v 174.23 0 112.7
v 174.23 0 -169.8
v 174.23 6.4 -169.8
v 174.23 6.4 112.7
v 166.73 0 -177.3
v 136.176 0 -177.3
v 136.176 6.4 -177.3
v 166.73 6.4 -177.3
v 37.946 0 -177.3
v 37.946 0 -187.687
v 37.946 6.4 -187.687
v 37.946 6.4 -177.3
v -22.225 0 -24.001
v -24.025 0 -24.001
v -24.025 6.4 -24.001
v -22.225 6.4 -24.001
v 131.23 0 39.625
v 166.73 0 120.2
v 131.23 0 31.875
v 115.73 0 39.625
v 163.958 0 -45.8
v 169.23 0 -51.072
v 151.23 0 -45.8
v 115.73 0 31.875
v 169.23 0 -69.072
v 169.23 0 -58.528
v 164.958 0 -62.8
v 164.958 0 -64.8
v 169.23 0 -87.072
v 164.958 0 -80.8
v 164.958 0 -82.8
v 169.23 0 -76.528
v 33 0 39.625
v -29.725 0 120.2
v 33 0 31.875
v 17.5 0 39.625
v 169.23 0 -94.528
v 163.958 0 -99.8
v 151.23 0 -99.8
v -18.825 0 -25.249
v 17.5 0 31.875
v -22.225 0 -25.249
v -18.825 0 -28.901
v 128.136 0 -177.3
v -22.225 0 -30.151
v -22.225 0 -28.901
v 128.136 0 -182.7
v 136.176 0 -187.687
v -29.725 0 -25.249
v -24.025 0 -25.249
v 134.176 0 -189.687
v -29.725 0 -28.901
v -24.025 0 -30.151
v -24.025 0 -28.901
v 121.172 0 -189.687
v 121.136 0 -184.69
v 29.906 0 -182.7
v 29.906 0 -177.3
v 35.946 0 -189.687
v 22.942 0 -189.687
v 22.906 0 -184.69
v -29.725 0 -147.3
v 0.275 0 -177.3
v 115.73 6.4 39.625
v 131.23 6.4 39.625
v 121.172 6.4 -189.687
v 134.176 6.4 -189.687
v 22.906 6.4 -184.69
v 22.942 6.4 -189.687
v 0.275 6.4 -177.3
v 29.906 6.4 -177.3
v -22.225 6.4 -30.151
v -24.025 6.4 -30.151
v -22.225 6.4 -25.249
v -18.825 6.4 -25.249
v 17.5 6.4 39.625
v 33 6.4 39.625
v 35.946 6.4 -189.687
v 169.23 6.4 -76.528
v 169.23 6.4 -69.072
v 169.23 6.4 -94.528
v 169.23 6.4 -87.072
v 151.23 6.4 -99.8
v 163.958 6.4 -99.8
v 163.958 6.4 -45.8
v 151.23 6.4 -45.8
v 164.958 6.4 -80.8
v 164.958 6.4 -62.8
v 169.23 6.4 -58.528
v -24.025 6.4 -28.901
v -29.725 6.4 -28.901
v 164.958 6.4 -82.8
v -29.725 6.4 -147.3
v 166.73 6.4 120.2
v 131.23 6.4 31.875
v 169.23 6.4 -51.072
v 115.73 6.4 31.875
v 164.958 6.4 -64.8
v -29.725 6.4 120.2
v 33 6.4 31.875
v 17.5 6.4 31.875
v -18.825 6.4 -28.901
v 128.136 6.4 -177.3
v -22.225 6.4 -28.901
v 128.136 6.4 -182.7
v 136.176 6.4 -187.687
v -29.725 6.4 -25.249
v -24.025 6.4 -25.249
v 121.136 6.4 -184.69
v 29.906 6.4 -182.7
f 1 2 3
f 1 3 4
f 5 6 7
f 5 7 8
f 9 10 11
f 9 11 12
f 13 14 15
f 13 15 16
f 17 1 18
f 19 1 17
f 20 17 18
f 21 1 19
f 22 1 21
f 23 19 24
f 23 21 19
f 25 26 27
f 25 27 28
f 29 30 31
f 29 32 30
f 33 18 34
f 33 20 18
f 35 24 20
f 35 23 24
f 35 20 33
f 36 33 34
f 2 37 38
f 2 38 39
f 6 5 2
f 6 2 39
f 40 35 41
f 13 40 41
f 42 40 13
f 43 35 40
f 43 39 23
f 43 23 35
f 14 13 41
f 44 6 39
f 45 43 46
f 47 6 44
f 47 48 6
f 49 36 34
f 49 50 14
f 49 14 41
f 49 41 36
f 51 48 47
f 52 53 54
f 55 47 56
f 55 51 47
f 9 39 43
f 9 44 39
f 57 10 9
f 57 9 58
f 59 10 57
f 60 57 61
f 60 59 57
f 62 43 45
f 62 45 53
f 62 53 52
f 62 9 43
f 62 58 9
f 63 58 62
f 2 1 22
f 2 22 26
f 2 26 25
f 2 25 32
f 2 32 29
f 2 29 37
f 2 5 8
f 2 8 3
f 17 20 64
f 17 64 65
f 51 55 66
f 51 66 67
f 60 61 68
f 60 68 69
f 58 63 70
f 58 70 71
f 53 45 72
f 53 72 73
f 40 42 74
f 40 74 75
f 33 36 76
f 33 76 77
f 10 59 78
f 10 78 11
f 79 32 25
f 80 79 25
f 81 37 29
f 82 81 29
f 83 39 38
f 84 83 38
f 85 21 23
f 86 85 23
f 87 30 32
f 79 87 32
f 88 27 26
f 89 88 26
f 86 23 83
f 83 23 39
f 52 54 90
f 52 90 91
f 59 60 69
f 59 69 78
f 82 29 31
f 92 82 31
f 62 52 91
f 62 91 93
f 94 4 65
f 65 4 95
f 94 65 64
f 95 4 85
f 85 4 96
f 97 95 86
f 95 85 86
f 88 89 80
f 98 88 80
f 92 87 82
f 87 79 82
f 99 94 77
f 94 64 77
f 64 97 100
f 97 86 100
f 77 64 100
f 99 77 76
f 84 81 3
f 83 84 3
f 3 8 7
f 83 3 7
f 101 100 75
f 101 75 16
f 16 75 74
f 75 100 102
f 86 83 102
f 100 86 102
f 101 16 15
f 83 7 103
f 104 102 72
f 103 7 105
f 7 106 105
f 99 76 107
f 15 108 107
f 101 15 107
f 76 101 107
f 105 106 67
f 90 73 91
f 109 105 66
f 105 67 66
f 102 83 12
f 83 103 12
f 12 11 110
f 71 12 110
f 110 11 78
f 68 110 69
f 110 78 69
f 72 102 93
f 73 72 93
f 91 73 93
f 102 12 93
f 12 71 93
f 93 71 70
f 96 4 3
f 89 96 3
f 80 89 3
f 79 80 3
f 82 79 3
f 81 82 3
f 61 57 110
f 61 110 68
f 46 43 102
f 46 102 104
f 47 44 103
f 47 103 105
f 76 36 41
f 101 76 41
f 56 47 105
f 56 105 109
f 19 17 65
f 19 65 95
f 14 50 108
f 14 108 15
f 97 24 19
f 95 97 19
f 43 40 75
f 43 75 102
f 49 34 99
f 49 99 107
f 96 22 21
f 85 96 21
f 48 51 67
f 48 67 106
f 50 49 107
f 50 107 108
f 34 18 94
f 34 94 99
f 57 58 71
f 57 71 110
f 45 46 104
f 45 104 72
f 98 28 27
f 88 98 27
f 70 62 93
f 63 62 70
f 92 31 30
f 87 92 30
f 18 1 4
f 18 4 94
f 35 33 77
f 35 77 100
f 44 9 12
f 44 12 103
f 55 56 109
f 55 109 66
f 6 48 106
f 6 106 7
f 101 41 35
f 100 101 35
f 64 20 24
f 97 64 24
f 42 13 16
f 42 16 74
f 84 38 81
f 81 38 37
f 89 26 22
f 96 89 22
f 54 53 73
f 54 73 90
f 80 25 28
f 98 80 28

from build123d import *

# Parameters (mm, degrees)
SKETCH1_W           = 15.5
SKETCH1_H           = 7.75
BOSS_EXTRUDE1_DEPTH = 6.4


with BuildPart() as part:
    # Sketch1 → Boss-Extrude1 (new body)
    with BuildSketch(Plane(origin=(0, 0, 0), x_dir=(1, 0, 0), z_dir=(0, 1, 0))):
        Polygon((136.176, 177.3), (166.73, 177.3), (174.23, 169.8), (174.23, -112.7), (166.73, -120.2), (-29.725, -120.2), (-29.725, 25.249320413), (-24.025, 25.249320413), (-24.025, 24.000679587), (-22.225, 24.000679587), (-22.225, 25.249320413), (-18.825, 25.249320413), (-18.825, 28.900679587), (-22.225, 28.900679587), (-22.225, 30.150679587), (-24.025, 30.150679587), (-24.025, 28.900679587), (-29.725, 28.900679587), (-29.725, 147.3), (0.275, 177.3), (29.906, 177.3), (29.906, 182.7), (22.906, 184.689990555), (22.941578202, 189.687449255), (35.946, 189.687449255), (37.946, 187.687449255), (37.946, 177.3), (128.136, 177.3), (128.136, 182.7), (121.136, 184.689990555), (121.171578202, 189.687449255), (134.176, 189.687449255), (136.176, 187.687449255), align=None)
        with Locations((123.48, -35.75)):
            Rectangle(SKETCH1_W, SKETCH1_H, mode=Mode.SUBTRACT)
        with Locations((25.25, -35.75)):
            Rectangle(SKETCH1_W, SKETCH1_H, mode=Mode.SUBTRACT)
        Polygon((164.957922061, 82.8), (164.957922061, 80.8), (169.23, 76.527922061), (169.23, 69.072077939), (164.957922061, 64.8), (164.957922061, 62.8), (169.23, 58.527922061), (169.23, 51.072077939), (163.957922061, 45.8), (151.23, 45.8), (151.23, 99.8), (163.957922061, 99.8), (169.23, 94.527922061), (169.23, 87.072077939), align=None, mode=Mode.SUBTRACT)
    extrude(amount=BOSS_EXTRUDE1_DEPTH)


solid = part.part
